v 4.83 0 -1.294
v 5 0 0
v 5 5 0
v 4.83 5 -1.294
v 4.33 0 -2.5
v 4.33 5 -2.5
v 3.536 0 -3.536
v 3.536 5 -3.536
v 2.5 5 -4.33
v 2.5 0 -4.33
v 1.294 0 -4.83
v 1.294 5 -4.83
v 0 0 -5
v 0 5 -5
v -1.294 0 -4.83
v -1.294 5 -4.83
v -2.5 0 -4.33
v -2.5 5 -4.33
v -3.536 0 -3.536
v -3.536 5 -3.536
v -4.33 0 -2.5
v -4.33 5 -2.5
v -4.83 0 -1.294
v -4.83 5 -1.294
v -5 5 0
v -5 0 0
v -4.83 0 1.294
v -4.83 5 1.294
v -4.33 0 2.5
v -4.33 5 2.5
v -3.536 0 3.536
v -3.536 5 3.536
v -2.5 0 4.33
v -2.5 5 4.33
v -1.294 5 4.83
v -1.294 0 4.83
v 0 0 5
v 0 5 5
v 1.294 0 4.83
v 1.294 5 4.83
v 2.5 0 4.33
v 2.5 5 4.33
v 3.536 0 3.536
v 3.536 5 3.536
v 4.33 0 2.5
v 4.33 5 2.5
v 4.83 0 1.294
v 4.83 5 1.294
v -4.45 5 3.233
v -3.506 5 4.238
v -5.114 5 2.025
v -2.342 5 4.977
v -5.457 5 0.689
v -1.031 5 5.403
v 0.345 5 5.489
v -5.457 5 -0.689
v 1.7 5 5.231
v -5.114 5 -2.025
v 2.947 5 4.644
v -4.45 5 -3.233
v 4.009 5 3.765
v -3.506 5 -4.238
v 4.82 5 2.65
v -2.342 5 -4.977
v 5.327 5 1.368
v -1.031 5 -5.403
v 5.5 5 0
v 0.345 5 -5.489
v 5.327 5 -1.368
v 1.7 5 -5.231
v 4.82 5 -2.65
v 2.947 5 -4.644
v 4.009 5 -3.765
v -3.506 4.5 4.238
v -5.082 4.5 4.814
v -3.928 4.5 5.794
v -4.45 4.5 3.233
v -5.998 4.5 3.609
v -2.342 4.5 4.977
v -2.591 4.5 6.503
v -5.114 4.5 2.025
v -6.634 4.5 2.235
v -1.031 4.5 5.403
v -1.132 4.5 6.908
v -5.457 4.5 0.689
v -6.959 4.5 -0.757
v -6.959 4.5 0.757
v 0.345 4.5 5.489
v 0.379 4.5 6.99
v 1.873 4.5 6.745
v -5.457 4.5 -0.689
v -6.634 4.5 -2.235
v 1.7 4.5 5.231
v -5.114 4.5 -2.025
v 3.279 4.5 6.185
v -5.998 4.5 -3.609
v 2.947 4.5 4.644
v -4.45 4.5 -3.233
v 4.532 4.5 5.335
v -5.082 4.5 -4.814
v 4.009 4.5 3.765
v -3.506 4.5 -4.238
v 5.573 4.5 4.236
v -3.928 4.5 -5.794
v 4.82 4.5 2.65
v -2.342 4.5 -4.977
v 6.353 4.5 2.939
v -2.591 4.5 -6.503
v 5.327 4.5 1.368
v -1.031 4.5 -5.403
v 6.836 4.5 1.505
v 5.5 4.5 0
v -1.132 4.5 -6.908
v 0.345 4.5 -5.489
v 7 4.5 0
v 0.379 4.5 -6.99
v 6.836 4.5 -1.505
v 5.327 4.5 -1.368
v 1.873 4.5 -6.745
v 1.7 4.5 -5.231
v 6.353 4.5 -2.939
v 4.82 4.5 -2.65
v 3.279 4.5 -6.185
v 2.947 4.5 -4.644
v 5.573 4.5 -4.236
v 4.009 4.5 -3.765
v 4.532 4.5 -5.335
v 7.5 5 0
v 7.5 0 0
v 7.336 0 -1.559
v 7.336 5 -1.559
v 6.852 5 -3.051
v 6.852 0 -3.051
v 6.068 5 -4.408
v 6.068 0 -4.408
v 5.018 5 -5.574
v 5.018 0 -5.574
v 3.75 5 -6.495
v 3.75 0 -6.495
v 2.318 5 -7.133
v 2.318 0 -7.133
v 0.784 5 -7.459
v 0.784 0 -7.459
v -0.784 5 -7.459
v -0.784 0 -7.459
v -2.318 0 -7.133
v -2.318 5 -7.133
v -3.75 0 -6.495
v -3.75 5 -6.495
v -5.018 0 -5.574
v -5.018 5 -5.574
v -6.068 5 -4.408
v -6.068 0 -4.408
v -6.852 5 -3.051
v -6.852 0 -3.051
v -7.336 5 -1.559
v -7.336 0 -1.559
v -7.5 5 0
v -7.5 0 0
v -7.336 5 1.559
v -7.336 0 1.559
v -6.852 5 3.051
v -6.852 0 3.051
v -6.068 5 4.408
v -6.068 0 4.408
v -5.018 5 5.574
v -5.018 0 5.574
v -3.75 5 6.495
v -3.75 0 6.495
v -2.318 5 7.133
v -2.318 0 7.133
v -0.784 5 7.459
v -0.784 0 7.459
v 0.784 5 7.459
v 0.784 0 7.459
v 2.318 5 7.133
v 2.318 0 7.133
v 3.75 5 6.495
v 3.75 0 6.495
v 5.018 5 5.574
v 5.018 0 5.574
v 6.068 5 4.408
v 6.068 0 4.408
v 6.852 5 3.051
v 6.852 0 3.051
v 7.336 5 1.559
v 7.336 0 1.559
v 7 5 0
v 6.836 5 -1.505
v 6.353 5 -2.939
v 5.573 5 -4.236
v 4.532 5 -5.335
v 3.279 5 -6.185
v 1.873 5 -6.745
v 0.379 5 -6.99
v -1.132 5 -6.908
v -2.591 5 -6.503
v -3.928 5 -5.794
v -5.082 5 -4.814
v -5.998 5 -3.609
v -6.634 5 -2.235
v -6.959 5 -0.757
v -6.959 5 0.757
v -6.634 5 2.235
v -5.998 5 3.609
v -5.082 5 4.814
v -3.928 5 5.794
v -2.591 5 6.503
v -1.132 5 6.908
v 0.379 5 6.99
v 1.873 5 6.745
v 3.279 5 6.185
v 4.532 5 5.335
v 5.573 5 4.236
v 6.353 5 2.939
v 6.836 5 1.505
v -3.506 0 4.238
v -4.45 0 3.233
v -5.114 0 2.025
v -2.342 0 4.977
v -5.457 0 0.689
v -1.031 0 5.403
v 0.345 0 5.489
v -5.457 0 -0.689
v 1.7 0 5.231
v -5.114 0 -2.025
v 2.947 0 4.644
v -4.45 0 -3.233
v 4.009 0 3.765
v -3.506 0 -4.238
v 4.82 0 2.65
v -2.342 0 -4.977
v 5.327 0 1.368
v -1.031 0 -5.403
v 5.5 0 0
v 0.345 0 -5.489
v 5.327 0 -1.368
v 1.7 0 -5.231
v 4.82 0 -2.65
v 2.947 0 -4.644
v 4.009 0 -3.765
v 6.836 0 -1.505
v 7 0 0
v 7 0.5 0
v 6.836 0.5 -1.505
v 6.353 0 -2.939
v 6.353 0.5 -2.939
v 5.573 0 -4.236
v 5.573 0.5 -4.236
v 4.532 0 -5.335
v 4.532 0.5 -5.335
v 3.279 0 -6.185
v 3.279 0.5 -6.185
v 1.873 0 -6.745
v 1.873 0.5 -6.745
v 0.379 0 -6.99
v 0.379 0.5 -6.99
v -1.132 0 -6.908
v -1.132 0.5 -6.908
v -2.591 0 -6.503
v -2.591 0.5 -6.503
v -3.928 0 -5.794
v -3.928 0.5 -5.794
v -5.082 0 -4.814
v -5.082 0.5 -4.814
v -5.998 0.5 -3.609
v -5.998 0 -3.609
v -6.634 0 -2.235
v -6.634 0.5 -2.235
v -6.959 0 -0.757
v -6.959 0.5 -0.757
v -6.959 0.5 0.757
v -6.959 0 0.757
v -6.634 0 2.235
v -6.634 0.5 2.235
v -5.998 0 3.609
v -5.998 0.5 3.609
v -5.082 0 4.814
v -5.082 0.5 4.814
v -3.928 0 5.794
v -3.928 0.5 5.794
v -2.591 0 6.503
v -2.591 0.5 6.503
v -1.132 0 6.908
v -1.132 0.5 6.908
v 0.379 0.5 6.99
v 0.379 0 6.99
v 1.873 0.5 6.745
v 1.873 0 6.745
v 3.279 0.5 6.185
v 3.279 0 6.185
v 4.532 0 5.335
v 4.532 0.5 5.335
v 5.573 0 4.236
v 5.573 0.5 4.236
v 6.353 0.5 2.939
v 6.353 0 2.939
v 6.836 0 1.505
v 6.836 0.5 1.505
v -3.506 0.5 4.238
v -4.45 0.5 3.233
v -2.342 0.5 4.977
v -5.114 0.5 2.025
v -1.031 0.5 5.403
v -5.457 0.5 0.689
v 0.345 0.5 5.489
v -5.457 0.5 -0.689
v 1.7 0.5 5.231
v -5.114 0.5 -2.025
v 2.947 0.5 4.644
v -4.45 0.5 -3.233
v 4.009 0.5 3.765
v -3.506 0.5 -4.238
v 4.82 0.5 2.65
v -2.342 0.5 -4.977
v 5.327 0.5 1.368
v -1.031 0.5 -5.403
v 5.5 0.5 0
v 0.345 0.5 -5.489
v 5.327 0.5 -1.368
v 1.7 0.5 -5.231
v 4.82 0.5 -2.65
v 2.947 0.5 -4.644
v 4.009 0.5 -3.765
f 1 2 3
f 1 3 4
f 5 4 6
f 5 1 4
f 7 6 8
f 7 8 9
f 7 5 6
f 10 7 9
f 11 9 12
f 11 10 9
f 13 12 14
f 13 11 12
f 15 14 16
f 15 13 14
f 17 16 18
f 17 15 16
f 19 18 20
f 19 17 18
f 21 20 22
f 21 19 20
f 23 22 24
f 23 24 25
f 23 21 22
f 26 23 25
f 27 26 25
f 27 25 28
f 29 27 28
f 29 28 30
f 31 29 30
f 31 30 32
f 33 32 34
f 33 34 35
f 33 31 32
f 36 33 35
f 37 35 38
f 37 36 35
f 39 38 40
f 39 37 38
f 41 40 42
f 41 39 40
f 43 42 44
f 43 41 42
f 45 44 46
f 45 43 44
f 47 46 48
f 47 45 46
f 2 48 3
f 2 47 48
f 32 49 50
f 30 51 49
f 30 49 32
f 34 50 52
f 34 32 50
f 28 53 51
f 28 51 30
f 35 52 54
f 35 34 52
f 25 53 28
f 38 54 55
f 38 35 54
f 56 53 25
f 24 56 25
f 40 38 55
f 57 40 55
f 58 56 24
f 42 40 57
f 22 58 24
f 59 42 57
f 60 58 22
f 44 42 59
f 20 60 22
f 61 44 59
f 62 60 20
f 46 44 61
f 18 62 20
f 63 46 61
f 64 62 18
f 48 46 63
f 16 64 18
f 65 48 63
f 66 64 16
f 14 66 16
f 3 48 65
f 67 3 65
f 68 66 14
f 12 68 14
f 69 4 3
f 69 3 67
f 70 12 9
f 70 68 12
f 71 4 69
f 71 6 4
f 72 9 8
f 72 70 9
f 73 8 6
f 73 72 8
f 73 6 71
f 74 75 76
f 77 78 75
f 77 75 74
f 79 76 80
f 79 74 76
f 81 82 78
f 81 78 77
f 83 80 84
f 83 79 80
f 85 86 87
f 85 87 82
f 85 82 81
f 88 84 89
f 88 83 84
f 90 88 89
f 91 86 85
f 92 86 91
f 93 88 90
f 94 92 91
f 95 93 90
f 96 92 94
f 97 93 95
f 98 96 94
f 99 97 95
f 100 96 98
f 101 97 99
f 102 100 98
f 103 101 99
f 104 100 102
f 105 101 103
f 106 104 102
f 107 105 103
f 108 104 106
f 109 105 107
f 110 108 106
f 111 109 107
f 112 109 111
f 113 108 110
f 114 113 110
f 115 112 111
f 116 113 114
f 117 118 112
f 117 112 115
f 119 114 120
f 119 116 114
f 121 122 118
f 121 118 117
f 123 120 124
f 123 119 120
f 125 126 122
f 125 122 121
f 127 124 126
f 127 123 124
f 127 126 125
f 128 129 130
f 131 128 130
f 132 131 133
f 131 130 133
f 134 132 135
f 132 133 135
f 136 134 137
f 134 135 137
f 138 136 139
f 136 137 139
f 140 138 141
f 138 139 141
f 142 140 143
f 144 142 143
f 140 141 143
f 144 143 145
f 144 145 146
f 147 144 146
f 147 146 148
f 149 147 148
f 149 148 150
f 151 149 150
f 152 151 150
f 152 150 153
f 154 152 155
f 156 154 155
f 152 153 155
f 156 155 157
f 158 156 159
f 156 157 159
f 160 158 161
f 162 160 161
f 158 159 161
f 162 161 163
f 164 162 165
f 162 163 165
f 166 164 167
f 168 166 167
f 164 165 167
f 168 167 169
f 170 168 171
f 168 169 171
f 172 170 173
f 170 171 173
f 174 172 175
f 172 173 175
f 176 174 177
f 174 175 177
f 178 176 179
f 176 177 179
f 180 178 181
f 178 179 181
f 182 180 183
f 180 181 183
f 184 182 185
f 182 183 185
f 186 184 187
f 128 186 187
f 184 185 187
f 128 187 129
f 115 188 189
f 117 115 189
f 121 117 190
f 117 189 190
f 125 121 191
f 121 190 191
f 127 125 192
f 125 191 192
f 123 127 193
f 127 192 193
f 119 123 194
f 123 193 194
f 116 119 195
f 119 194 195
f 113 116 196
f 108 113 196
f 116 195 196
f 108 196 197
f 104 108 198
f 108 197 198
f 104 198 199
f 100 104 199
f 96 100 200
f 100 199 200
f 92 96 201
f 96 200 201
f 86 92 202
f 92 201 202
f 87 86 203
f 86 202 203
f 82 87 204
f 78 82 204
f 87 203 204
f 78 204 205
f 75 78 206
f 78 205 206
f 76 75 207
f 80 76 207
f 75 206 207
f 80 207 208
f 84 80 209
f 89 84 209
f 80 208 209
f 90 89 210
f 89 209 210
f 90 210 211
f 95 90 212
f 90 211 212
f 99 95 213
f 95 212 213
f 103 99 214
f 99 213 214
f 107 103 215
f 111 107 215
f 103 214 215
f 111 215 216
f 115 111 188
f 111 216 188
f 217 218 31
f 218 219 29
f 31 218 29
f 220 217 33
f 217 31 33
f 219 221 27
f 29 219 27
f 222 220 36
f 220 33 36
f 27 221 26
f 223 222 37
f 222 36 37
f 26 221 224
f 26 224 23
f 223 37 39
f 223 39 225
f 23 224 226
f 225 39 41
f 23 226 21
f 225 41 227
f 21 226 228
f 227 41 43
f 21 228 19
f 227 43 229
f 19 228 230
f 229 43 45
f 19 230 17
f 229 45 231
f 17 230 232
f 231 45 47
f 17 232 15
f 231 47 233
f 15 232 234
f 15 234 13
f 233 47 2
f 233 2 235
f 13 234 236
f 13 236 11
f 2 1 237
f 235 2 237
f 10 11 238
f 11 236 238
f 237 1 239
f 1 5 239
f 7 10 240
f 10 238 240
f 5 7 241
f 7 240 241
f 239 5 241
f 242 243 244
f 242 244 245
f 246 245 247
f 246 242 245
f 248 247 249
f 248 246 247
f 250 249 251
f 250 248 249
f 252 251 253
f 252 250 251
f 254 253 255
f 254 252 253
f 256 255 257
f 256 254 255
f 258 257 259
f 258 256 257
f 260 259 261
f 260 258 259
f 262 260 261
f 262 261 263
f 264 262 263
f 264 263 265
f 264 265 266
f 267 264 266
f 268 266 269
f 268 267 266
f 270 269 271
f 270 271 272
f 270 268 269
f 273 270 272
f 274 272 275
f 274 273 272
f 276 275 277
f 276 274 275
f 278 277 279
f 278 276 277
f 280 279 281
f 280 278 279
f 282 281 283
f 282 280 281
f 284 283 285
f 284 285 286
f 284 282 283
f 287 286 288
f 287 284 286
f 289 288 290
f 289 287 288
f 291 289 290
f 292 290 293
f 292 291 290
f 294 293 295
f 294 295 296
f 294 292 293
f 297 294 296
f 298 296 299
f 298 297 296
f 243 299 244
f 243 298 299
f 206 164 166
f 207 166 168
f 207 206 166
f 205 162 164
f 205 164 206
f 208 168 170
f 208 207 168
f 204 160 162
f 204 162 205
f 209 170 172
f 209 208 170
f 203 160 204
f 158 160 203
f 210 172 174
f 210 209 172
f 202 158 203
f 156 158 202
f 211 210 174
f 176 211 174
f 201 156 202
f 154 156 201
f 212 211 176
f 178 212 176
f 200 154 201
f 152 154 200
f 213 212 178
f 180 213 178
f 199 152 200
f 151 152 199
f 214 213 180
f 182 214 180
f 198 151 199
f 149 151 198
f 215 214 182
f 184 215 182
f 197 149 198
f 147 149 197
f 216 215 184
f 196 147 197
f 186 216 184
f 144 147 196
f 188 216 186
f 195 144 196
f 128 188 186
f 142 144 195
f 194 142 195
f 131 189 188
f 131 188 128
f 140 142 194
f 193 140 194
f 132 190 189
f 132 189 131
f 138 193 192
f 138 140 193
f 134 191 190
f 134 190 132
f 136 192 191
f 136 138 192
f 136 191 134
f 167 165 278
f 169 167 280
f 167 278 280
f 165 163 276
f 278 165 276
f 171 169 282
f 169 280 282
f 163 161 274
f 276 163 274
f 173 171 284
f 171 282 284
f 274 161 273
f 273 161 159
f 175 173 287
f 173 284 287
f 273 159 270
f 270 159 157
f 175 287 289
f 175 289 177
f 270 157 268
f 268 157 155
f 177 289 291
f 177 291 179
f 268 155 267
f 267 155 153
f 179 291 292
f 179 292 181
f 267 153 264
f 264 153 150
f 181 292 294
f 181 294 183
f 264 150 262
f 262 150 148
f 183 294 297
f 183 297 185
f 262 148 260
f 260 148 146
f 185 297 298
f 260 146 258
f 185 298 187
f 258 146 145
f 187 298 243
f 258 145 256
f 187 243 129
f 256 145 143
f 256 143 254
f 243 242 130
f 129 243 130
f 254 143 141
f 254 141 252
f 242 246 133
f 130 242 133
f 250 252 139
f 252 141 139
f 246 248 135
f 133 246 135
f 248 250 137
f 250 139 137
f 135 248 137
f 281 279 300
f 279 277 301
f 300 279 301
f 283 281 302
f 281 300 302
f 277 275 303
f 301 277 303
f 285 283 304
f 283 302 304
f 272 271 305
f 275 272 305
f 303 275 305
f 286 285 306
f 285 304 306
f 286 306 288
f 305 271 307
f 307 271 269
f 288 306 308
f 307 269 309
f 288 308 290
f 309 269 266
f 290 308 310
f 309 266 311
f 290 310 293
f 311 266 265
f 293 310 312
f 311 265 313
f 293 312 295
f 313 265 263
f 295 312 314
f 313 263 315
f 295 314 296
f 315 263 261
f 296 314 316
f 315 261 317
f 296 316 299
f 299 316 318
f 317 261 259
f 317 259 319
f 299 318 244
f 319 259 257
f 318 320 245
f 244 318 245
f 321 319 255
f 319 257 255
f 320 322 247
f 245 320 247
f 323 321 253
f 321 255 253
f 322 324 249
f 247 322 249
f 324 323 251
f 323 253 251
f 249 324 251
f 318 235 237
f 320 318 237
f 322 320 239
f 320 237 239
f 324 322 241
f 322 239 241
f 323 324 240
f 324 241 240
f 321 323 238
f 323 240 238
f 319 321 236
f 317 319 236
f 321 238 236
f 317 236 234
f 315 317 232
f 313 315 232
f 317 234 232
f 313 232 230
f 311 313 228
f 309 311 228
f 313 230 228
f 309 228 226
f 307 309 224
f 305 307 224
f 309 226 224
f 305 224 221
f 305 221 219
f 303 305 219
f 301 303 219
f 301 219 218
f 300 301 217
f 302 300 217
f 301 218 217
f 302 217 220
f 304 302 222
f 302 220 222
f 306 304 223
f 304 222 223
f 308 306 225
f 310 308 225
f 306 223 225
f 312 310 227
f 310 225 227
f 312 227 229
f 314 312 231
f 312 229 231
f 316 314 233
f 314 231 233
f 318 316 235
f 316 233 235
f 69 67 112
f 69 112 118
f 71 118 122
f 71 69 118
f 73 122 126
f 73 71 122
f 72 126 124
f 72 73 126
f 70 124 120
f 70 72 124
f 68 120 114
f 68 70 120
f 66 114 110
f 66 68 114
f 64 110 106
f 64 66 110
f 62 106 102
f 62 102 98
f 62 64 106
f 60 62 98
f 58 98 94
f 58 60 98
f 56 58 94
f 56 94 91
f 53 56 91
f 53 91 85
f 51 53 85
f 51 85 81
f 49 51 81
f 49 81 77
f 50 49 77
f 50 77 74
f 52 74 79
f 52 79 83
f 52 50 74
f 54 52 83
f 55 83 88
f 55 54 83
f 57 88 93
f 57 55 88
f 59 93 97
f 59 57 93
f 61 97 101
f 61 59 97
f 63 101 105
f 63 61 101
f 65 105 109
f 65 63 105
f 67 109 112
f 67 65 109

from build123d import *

# Parameters (mm, degrees)
SKETCH1_R           = 7.5
SKETCH1_R_2         = 5
BOSS_EXTRUDE1_DEPTH = 5
SKETCH2_R           = 7
SKETCH2_R_2         = 5.5
CUT_EXTRUDE1_DEPTH  = 0.5


with BuildPart() as part:
    # Sketch1 → Boss-Extrude1 (new body)
    with BuildSketch(Plane(origin=(0, 0, 0), x_dir=(1, 0, 0), z_dir=(0, 1, 0))):
        Circle(SKETCH1_R)
        Circle(SKETCH1_R_2, mode=Mode.SUBTRACT)
    extrude(amount=BOSS_EXTRUDE1_DEPTH)

    # Sketch2 → Cut-Extrude1 (cut)
    with BuildSketch(Plane(origin=(0, 5, 0), x_dir=(1, 0, 0), z_dir=(0, 1, 0))):
        Circle(SKETCH2_R)
        Circle(SKETCH2_R_2, mode=Mode.SUBTRACT)
    cut_extrude1 = extrude(amount=-CUT_EXTRUDE1_DEPTH, mode=Mode.SUBTRACT)

    # Mirror1: Cut-Extrude1 across plane
    add(cut_extrude1.mirror(Plane(origin=(0, 2.5, 0), x_dir=(0, 0, 1), z_dir=(0, -1, 0))), mode=Mode.SUBTRACT)


solid = part.part
